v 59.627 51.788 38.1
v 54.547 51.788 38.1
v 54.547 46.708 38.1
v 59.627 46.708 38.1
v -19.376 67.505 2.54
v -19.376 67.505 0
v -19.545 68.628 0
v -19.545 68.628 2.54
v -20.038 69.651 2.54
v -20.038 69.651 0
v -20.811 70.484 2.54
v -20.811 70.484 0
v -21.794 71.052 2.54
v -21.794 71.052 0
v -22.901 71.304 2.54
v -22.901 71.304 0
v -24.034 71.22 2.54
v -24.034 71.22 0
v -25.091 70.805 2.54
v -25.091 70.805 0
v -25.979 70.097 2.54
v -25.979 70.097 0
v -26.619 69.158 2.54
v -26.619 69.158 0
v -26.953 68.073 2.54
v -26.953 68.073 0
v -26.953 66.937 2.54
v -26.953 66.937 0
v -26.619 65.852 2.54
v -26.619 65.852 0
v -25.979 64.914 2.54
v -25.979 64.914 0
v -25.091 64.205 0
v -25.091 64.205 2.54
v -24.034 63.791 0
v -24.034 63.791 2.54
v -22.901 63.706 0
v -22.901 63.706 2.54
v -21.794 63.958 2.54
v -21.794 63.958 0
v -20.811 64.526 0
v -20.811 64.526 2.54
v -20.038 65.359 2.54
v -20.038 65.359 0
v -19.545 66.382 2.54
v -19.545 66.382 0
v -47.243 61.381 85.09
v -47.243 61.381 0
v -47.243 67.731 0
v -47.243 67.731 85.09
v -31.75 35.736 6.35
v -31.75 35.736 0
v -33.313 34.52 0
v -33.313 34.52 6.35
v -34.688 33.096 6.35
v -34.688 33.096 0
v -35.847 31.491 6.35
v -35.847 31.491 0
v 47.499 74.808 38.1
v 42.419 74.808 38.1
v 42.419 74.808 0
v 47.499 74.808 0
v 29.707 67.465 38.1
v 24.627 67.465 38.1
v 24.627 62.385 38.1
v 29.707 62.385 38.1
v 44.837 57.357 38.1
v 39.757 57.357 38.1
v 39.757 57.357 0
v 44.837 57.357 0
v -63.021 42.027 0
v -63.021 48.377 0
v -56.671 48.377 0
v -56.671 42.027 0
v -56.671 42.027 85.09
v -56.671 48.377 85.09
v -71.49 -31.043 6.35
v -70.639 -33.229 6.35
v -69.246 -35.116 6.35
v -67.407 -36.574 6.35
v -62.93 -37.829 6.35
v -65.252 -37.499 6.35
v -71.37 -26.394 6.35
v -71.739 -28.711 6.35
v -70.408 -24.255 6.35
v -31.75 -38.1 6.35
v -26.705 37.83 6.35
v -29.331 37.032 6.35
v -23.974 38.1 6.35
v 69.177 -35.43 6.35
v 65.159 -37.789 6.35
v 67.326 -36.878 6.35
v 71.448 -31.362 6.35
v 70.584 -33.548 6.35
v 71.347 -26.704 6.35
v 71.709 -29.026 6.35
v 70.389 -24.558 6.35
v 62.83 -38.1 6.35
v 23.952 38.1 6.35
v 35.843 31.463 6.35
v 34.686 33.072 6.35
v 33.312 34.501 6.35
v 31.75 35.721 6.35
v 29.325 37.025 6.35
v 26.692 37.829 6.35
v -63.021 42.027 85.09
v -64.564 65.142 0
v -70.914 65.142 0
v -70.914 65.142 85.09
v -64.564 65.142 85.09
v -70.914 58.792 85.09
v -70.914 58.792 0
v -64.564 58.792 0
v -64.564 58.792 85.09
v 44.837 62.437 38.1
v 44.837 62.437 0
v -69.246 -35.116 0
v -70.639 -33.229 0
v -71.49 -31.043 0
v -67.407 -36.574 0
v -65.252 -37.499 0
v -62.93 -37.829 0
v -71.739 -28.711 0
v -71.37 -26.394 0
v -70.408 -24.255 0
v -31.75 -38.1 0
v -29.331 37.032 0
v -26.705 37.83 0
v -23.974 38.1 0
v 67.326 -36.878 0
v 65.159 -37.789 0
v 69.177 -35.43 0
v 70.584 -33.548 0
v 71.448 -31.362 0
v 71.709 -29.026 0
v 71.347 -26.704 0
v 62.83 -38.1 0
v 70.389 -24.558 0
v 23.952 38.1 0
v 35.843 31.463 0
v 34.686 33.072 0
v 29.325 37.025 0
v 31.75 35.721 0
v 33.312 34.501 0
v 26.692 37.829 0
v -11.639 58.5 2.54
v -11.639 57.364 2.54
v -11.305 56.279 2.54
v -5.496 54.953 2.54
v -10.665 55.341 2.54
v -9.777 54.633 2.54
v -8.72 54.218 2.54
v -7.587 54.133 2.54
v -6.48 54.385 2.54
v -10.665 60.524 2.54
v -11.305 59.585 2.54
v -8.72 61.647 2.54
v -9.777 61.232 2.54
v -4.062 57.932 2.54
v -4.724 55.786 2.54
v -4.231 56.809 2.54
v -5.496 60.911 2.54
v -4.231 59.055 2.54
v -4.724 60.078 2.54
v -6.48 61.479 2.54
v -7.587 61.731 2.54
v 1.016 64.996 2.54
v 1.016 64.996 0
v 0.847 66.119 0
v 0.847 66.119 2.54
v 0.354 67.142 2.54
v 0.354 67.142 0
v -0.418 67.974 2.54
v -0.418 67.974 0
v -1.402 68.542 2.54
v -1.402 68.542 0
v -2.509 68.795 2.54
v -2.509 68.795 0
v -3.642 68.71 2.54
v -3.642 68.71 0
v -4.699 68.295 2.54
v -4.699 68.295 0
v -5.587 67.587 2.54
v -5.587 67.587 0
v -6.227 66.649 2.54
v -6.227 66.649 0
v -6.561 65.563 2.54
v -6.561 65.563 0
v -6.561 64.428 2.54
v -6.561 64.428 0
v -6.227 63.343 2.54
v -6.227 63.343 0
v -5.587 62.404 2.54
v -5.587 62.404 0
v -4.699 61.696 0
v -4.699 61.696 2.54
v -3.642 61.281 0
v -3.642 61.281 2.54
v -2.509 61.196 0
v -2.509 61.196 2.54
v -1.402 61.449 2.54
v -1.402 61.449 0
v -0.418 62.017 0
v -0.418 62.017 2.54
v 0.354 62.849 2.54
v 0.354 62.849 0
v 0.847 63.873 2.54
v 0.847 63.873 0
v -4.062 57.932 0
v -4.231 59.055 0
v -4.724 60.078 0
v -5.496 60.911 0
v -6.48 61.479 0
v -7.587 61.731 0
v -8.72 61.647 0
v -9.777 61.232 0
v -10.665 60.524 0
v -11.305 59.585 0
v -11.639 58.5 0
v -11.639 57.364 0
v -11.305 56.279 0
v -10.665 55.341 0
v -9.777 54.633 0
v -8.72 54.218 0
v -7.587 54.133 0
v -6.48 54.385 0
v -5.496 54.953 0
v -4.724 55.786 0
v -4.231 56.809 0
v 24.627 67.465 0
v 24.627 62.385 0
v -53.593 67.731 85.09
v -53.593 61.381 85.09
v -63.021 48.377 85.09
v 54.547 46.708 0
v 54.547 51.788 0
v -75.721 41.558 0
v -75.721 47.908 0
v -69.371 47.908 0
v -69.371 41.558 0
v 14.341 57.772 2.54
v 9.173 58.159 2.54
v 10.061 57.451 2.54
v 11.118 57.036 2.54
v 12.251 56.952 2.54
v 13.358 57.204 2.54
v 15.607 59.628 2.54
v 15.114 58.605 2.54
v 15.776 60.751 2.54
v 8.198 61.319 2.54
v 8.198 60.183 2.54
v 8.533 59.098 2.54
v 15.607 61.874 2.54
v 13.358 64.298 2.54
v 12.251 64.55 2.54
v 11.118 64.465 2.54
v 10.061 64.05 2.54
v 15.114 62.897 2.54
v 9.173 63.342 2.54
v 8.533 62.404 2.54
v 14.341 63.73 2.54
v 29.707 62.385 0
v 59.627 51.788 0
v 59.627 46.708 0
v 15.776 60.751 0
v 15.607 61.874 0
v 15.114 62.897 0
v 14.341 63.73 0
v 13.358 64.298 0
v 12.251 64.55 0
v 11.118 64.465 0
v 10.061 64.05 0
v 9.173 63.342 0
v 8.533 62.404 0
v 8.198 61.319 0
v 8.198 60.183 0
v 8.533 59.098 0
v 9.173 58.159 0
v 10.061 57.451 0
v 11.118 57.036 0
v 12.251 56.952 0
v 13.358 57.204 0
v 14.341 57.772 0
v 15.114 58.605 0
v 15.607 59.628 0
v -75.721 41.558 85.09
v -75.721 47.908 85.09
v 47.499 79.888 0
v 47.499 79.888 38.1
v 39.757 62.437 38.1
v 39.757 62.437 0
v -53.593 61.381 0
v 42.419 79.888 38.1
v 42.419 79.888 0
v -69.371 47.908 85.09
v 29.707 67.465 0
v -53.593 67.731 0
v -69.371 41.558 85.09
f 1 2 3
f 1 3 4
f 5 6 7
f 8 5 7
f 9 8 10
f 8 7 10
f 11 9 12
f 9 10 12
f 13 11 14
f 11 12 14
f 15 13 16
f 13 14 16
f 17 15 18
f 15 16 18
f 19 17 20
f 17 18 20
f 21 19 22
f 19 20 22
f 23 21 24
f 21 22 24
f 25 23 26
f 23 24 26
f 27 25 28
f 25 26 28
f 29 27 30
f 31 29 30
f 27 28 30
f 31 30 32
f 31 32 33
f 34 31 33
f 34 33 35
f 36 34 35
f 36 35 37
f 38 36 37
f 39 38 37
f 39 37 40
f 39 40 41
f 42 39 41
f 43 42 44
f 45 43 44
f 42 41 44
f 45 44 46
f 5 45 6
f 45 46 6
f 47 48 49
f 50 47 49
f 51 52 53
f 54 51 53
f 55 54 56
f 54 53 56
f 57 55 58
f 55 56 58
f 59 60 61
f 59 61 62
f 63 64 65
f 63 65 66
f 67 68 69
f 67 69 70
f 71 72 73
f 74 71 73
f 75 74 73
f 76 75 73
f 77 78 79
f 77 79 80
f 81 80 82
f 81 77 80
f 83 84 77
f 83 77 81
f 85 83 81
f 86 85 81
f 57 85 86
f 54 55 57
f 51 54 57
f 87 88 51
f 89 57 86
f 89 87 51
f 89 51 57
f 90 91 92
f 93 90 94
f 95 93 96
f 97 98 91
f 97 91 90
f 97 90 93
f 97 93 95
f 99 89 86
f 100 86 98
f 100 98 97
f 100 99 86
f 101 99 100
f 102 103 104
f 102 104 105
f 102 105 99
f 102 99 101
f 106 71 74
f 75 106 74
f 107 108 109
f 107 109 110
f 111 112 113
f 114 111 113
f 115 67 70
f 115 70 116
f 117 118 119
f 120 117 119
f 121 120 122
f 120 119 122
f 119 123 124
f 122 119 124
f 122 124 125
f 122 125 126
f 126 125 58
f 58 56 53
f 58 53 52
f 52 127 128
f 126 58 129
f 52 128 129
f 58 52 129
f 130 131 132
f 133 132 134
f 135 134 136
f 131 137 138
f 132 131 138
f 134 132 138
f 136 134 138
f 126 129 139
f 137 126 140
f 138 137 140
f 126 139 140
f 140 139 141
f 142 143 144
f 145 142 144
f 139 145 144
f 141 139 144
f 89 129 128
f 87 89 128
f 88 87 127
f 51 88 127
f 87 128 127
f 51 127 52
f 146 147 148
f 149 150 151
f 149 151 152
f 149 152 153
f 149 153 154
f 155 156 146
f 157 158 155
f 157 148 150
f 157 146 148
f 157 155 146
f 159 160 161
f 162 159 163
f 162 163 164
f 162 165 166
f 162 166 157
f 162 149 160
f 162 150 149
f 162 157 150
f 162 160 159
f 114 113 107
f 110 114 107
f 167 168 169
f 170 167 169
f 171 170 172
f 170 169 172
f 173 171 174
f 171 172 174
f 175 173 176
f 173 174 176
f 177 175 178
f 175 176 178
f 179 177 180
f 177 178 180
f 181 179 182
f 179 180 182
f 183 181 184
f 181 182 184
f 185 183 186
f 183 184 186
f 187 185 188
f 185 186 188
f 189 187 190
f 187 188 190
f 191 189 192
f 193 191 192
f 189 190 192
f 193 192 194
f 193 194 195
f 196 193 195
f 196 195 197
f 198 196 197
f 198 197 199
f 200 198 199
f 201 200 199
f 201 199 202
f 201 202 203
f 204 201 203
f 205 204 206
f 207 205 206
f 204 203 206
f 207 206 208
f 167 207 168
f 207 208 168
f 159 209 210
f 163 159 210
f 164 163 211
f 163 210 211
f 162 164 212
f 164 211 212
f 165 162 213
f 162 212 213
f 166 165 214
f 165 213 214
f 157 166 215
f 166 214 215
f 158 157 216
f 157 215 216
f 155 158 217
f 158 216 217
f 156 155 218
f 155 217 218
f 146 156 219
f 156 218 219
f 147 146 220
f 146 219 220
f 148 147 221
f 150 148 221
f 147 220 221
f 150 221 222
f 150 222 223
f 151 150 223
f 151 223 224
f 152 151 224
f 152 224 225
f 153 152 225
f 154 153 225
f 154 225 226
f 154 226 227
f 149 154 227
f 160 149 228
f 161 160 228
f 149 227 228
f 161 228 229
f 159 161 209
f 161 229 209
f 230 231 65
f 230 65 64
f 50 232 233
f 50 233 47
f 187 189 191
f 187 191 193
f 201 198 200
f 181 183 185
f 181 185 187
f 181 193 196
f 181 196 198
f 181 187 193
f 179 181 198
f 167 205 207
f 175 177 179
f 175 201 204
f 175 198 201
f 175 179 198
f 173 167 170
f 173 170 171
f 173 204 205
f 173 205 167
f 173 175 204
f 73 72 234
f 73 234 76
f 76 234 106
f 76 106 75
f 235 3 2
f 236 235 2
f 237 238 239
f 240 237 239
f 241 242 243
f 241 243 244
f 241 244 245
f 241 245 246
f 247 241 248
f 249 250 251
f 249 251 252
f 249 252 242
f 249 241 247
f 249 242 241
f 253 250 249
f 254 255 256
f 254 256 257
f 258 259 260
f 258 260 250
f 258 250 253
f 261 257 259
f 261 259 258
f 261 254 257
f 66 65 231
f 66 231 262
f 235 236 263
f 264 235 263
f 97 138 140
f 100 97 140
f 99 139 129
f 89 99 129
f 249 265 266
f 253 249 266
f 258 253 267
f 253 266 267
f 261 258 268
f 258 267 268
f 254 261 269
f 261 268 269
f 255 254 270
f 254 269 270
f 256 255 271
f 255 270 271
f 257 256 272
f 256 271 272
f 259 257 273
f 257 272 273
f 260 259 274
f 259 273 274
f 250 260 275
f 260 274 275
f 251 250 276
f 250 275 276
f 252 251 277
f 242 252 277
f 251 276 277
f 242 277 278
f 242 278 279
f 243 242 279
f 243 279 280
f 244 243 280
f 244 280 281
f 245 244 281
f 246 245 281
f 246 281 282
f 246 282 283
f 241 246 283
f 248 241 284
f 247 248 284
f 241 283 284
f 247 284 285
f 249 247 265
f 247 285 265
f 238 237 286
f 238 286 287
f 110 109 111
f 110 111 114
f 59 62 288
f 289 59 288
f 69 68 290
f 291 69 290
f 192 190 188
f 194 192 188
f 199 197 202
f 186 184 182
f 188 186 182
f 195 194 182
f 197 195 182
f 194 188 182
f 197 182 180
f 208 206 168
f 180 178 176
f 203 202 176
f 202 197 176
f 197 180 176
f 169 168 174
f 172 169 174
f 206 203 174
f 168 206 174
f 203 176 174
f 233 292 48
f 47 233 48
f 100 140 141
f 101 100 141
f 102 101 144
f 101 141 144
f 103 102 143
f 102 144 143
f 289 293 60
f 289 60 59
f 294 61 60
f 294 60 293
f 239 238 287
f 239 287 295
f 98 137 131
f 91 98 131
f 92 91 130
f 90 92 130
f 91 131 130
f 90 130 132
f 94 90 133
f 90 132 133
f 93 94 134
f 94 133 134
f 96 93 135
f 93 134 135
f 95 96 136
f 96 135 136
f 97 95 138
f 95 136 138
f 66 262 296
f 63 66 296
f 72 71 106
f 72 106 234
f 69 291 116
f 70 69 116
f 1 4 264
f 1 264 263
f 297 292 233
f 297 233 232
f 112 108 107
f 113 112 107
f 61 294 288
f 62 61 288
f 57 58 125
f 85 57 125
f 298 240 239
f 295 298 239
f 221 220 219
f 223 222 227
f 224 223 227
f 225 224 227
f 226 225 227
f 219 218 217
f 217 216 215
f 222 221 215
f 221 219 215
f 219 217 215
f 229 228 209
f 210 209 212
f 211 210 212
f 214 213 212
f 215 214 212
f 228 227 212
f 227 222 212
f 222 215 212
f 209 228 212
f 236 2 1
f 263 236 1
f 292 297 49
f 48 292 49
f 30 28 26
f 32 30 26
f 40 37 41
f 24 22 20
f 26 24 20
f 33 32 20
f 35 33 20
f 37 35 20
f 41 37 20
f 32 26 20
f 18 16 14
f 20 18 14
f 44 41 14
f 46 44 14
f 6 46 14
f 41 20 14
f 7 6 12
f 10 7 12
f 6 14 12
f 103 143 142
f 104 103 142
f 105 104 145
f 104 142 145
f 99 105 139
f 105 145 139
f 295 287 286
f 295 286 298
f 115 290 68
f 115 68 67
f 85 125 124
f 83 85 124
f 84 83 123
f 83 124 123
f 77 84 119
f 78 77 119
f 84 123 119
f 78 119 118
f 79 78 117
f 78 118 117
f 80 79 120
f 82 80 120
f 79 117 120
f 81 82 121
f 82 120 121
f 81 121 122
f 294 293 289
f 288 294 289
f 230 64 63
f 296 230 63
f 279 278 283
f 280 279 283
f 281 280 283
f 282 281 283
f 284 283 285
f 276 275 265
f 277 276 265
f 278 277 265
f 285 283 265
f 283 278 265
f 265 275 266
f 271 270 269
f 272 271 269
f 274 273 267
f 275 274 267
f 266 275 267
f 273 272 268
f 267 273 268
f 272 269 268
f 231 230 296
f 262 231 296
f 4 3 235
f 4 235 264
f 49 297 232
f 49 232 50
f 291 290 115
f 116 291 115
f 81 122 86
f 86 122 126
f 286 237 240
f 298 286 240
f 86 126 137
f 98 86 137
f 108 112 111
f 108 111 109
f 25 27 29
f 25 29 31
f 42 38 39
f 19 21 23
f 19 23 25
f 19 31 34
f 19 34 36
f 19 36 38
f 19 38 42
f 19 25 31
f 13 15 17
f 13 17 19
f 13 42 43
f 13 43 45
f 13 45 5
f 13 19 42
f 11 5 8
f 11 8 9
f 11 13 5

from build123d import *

# Parameters (mm, degrees)
F1_DEPTH = 6.35
F2_W     = 6.35
F2_H     = 6.35
F3_DEPTH = 85.09
F4_W     = 5.08
F4_H     = 5.08
F5_DEPTH = 38.1
F6_R     = 3.81
F8_DEPTH = 2.54


# Not quite as in the source:
# - the program builds the solid bodies; features that only make, move or delete a surface that nothing else refers to are left out


with BuildPart() as f1:
    # F0 (on Top) → F1 (new body)
    with BuildSketch(Plane.XY):
        with BuildLine():
            ThreePointArc((31.75, 35.721134447), (28.0284665024, 37.492055385), (23.9521475884, 38.1))
            Line((23.9521475884, 38.1), (-23.9740013608, 38.1))
            ThreePointArc((-23.9740013608, 38.1), (-28.0377301168, 37.4958897421), (-31.75, 35.7358065279))
            Line((-31.75, 35.7358065279), (-31.75, -38.1))
            Line((-31.75, -38.1), (31.75, -38.1))
            Line((31.75, -38.1), (31.75, 35.721134447))
        make_face()
        with BuildLine():
            Line((-31.75, -38.1), (-31.75, 35.7358065279))
            ThreePointArc((-31.75, 35.7358065279), (-34.0252899215, 33.8321903852), (-35.8473212157, 31.4910580505))
            Line((-35.8473212157, 31.4910580505), (-70.4080074235, -24.2550152634))
            ThreePointArc((-70.4080074235, -24.2550152634), (-70.6387165875, -33.2292164554), (-62.9295269359, -37.8289891312))
            Line((-62.9295269359, -37.8289891312), (-31.75, -38.1))
        make_face()
        with BuildLine():
            ThreePointArc((35.8430046385, 31.4626951809), (34.0241333068, 33.8107026443), (31.75, 35.721134447))
            Line((31.75, 35.721134447), (31.75, -38.1))
            Line((31.75, -38.1), (62.8297282478, -38.1))
            ThreePointArc((62.8297282478, -38.1), (70.5843439151, -33.5476304603), (70.3888780957, -24.5576401551))
            Line((70.3888780957, -24.5576401551), (35.8430046385, 31.4626951809))
        make_face()
    extrude(amount=F1_DEPTH)


with BuildPart() as f3:
    # F2 (on Top) → F3 (new body)
    with BuildSketch(Plane.XY):
        with Locations((-67.7386466112, 61.9670785964)):
            Rectangle(F2_W, F2_H)
    extrude(amount=F3_DEPTH)


with BuildPart() as f3b:
    # F2 (on Top) → F3, piece 2 (new body)
    with BuildSketch(Plane.XY):
        with Locations((-72.5461074233, 44.7328782558)):
            Rectangle(F2_W, F2_H)
    extrude(amount=F3_DEPTH)


with BuildPart() as f3c:
    # F2 (on Top) → F3, piece 3 (new body)
    with BuildSketch(Plane.XY):
        with Locations((-50.4183040082, 64.5559153438)):
            Rectangle(F2_W, F2_H)
    extrude(amount=F3_DEPTH)


with BuildPart() as f3d:
    # F2 (on Top) → F3, piece 4 (new body)
    with BuildSketch(Plane.XY):
        with Locations((-59.8461074233, 45.20164271)):
            Rectangle(F2_W, F2_H)
    extrude(amount=F3_DEPTH)


with BuildPart() as f5:
    # F4 (on Top) → F5 (new body)
    with BuildSketch(Plane.XY):
        with Locations((27.1672014992, 64.9249330163)):
            Rectangle(F4_W, F4_H)
    extrude(amount=F5_DEPTH)


with BuildPart() as f5b:
    # F4 (on Top) → F5, piece 2 (new body)
    with BuildSketch(Plane.XY):
        with Locations((44.959411025, 77.3479267955)):
            Rectangle(F4_W, F4_H)
    extrude(amount=F5_DEPTH)


with BuildPart() as f5c:
    # F4 (on Top) → F5, piece 3 (new body)
    with BuildSketch(Plane.XY):
        with Locations((42.2973409295, 59.8965808749)):
            Rectangle(F4_W, F4_H)
    extrude(amount=F5_DEPTH)


with BuildPart() as f5d:
    # F4 (on Top) → F5, piece 4 (new body)
    with BuildSketch(Plane.XY):
        with Locations((57.0866167545, 49.2483004928)):
            Rectangle(F4_W, F4_H)
    extrude(amount=F5_DEPTH)


with BuildPart() as f8:
    # F6 (on Top) → F8 (new body)
    with BuildSketch(Plane.XY):
        with Locations((-2.7939286083, 64.9956390262)):
            Circle(F6_R)
    extrude(amount=F8_DEPTH)


with BuildPart() as f8b:
    # F6 (on Top) → F8, piece 2 (new body)
    with BuildSketch(Plane.XY):
        with Locations((11.9659397751, 60.7509315014)):
            Circle(F6_R)
    extrude(amount=F8_DEPTH)


with BuildPart() as f8c:
    # F6 (on Top) → F8, piece 3 (new body)
    with BuildSketch(Plane.XY):
        with Locations((-7.8719547018, 57.932112366)):
            Circle(F6_R)
    extrude(amount=F8_DEPTH)


with BuildPart() as f8d:
    # F6 (on Top) → F8, piece 4 (new body)
    with BuildSketch(Plane.XY):
        with Locations((-23.1860335916, 67.5050541759)):
            Circle(F6_R)
    extrude(amount=F8_DEPTH)


solid = Compound([f1.part, f3.part, f3b.part, f3c.part, f3d.part, f5.part, f5b.part, f5c.part, f5d.part, f8.part, f8b.part, f8c.part, f8d.part])
